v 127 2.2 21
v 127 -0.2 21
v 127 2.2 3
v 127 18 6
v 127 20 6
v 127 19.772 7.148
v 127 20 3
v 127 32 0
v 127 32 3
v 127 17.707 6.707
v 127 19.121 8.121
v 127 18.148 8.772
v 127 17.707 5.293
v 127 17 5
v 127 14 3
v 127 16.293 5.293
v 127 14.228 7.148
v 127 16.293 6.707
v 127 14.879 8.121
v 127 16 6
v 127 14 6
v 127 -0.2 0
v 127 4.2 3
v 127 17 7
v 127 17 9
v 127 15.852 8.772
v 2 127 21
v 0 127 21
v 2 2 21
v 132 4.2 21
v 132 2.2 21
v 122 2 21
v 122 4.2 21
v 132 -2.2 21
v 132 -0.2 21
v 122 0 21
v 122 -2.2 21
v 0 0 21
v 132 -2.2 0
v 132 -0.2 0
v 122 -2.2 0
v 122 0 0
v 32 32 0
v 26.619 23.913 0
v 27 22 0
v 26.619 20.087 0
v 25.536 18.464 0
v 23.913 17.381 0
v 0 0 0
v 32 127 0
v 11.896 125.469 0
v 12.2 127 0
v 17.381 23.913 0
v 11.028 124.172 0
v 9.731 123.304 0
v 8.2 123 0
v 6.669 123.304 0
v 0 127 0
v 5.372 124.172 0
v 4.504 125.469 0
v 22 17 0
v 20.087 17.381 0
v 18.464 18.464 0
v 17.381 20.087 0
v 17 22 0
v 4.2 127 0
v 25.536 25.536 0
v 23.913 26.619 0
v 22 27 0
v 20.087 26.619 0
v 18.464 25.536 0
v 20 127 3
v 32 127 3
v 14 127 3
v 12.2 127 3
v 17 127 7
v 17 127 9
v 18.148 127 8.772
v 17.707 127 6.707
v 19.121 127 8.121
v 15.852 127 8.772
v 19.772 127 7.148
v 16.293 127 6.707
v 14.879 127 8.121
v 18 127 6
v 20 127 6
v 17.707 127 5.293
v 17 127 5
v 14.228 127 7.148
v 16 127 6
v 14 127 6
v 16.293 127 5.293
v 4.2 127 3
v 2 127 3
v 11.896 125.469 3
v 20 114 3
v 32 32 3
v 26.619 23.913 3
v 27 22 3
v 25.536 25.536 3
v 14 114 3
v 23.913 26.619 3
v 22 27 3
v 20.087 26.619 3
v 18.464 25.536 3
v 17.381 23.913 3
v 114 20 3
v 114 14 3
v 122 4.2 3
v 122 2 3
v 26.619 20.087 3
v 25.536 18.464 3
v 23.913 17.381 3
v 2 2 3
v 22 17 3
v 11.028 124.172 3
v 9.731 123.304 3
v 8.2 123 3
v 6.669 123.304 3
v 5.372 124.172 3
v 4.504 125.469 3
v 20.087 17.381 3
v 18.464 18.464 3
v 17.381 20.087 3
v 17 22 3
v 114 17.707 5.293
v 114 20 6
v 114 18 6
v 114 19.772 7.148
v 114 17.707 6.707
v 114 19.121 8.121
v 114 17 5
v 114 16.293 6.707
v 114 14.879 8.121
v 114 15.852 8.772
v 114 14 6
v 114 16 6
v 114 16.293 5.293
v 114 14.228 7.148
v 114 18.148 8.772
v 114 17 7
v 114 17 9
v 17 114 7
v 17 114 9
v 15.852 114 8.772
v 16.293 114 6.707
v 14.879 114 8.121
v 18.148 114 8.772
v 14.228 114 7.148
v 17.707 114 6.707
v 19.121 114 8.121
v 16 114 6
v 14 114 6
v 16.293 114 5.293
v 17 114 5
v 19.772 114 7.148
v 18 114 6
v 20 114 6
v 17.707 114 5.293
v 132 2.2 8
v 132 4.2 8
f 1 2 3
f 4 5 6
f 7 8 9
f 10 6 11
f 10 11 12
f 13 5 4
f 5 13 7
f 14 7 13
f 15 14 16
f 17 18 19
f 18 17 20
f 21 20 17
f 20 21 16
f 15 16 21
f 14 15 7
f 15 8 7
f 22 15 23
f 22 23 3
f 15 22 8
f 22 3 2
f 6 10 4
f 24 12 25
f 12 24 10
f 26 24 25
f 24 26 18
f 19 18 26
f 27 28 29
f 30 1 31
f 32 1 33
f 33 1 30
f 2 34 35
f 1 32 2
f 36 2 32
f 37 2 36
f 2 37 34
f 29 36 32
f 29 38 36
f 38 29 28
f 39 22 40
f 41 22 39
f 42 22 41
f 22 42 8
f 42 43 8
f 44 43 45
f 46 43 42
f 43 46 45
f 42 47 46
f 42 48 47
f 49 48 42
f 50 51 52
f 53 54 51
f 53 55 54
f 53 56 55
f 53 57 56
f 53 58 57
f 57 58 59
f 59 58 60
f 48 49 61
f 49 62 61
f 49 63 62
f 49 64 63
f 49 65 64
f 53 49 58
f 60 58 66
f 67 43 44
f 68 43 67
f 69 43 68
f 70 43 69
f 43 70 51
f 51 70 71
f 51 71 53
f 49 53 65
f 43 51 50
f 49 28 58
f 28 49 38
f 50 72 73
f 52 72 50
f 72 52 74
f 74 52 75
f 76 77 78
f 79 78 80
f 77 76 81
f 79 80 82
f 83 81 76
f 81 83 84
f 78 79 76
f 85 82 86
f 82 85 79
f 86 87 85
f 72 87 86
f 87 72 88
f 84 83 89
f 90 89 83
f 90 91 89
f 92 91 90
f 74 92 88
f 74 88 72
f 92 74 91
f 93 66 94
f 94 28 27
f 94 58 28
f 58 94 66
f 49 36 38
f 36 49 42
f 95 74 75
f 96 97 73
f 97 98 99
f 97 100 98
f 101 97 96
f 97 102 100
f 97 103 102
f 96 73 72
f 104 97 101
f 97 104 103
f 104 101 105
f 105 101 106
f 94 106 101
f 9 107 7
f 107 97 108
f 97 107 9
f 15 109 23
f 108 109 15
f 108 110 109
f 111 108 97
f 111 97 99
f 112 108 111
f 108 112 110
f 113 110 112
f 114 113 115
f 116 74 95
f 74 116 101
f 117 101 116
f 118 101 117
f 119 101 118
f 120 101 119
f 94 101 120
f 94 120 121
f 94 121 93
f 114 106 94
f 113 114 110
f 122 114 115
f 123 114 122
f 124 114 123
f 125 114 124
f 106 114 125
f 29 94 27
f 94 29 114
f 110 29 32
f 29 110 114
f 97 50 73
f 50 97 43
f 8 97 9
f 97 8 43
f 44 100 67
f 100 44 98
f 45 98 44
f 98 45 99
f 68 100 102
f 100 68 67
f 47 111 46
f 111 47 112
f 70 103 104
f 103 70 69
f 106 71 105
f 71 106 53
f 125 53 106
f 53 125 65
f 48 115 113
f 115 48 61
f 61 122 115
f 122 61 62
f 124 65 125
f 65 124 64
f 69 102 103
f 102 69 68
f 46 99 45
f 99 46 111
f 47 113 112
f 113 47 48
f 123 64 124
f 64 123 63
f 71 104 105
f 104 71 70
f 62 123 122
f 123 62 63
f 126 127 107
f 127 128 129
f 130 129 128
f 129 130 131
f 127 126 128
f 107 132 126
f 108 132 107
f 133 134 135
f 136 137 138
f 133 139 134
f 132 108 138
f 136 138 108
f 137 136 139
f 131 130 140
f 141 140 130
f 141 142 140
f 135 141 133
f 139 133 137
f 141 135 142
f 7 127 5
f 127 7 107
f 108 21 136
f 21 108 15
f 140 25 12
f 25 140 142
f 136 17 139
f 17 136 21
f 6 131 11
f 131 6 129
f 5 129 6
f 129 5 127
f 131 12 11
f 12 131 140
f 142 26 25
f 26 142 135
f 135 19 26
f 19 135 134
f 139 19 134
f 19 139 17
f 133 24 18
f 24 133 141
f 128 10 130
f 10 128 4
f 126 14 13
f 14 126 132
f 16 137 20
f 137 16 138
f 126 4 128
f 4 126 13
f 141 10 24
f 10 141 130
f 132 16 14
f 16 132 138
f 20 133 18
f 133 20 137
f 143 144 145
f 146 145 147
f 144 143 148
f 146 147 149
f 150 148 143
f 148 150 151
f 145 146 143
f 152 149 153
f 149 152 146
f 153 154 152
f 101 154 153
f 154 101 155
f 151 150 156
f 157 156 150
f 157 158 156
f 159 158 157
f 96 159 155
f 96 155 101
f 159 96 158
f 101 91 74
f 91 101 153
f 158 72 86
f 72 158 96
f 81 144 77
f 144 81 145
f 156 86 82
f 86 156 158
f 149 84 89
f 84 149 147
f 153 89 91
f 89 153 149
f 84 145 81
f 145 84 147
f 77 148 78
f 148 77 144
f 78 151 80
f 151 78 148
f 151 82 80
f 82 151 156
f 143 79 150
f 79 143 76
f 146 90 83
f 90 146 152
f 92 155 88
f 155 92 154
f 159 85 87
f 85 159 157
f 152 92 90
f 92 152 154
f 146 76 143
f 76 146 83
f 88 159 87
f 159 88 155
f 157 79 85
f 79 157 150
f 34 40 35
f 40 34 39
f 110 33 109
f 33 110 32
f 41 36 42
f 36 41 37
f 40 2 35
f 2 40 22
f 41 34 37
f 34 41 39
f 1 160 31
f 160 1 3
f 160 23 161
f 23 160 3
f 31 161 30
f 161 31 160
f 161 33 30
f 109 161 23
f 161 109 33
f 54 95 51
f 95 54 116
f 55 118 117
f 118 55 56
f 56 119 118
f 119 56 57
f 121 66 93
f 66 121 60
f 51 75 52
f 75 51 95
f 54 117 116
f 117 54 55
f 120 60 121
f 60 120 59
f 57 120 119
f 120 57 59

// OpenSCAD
// file: HeatbedIsolationModule.scad
thicknessBottom=3;
thicknessWall=2;

length=125;
totalLength=length+thicknessWall;

bottomLength=30;
bottomLengthWithOffset=bottomLength+thicknessWall;

height=18;
totalHeight=height+thicknessBottom;

bedHolderHoleDiameter=10;
bedHolderHoleOffset=20;

m3Diameter=3.4;
screwM3HolderDiameter=6;
screwM3HolderRadius=screwM3HolderDiameter/2;
screwM3HolderLength=13;

latchLength=5;
latchOffset=0.2;

wireHoleDiameter=8;

module screwM3Holder()
{
	difference()
	{
		union()
		{
			cube([screwM3HolderLength,screwM3HolderDiameter,screwM3HolderDiameter/2]);
			
			translate([0,screwM3HolderRadius,screwM3HolderRadius])
			rotate([0,90,0])
			cylinder(d=screwM3HolderDiameter,h=screwM3HolderLength,$fn=16);
		}
		
		translate([0,screwM3HolderRadius,screwM3HolderRadius])
		rotate([0,90,0])
		cylinder(d=2,h=screwM3HolderLength,$fn=8);
	}
}

module heatbedIsolation()
union()
{
	difference()
	{
		cube([totalLength,totalLength,totalHeight]);
		
		translate([thicknessWall,thicknessWall,thicknessBottom])
		cube([length+1,length+1,height+1]);
		
		translate([bottomLengthWithOffset,bottomLengthWithOffset,-1])
		cube([length-bottomLength+1,length-bottomLength+1,thicknessBottom+2]);
		
		translate([thicknessWall+bedHolderHoleOffset,thicknessWall+bedHolderHoleOffset,-1])
		cylinder(d=bedHolderHoleDiameter,h=thicknessBottom+2,$fn=16);
	}
	
	//Latch begin
	translate([totalLength-latchLength,-thicknessWall-latchOffset,0])
	cube([2*latchLength,thicknessWall,totalHeight]);
	
	translate([totalLength-latchLength,-thicknessWall-latchOffset,0])
	cube([latchLength,3*thicknessWall+latchOffset,totalHeight]);
	
	translate([totalLength-latchLength,2*thicknessWall+latchOffset,thicknessBottom])
	rotate([90,0,0])
	linear_extrude(thicknessWall)
	polygon([
		[0,0],
		[latchLength,0],
		[2*latchLength,latchLength],
		[2*latchLength,height],
		[0,height],
	]);
	//Latch end
	
	translate([totalLength-screwM3HolderLength,thicknessWall+(bottomLength-screwM3HolderDiameter)/2,thicknessBottom])
	screwM3Holder();
	
	translate([thicknessWall+screwM3HolderDiameter+(bottomLength-screwM3HolderDiameter)/2,totalLength-screwM3HolderLength,thicknessBottom])
	rotate([0,0,90])
	screwM3Holder();
}
// main file
include<HeatbedIsolationModule.scad>

difference()
{
	heatbedIsolation();
	
	translate([2*thicknessWall+latchOffset+wireHoleDiameter/2,totalLength,-1])
	cylinder(d=wireHoleDiameter,h=thicknessBottom+2,$fn=16);
}
